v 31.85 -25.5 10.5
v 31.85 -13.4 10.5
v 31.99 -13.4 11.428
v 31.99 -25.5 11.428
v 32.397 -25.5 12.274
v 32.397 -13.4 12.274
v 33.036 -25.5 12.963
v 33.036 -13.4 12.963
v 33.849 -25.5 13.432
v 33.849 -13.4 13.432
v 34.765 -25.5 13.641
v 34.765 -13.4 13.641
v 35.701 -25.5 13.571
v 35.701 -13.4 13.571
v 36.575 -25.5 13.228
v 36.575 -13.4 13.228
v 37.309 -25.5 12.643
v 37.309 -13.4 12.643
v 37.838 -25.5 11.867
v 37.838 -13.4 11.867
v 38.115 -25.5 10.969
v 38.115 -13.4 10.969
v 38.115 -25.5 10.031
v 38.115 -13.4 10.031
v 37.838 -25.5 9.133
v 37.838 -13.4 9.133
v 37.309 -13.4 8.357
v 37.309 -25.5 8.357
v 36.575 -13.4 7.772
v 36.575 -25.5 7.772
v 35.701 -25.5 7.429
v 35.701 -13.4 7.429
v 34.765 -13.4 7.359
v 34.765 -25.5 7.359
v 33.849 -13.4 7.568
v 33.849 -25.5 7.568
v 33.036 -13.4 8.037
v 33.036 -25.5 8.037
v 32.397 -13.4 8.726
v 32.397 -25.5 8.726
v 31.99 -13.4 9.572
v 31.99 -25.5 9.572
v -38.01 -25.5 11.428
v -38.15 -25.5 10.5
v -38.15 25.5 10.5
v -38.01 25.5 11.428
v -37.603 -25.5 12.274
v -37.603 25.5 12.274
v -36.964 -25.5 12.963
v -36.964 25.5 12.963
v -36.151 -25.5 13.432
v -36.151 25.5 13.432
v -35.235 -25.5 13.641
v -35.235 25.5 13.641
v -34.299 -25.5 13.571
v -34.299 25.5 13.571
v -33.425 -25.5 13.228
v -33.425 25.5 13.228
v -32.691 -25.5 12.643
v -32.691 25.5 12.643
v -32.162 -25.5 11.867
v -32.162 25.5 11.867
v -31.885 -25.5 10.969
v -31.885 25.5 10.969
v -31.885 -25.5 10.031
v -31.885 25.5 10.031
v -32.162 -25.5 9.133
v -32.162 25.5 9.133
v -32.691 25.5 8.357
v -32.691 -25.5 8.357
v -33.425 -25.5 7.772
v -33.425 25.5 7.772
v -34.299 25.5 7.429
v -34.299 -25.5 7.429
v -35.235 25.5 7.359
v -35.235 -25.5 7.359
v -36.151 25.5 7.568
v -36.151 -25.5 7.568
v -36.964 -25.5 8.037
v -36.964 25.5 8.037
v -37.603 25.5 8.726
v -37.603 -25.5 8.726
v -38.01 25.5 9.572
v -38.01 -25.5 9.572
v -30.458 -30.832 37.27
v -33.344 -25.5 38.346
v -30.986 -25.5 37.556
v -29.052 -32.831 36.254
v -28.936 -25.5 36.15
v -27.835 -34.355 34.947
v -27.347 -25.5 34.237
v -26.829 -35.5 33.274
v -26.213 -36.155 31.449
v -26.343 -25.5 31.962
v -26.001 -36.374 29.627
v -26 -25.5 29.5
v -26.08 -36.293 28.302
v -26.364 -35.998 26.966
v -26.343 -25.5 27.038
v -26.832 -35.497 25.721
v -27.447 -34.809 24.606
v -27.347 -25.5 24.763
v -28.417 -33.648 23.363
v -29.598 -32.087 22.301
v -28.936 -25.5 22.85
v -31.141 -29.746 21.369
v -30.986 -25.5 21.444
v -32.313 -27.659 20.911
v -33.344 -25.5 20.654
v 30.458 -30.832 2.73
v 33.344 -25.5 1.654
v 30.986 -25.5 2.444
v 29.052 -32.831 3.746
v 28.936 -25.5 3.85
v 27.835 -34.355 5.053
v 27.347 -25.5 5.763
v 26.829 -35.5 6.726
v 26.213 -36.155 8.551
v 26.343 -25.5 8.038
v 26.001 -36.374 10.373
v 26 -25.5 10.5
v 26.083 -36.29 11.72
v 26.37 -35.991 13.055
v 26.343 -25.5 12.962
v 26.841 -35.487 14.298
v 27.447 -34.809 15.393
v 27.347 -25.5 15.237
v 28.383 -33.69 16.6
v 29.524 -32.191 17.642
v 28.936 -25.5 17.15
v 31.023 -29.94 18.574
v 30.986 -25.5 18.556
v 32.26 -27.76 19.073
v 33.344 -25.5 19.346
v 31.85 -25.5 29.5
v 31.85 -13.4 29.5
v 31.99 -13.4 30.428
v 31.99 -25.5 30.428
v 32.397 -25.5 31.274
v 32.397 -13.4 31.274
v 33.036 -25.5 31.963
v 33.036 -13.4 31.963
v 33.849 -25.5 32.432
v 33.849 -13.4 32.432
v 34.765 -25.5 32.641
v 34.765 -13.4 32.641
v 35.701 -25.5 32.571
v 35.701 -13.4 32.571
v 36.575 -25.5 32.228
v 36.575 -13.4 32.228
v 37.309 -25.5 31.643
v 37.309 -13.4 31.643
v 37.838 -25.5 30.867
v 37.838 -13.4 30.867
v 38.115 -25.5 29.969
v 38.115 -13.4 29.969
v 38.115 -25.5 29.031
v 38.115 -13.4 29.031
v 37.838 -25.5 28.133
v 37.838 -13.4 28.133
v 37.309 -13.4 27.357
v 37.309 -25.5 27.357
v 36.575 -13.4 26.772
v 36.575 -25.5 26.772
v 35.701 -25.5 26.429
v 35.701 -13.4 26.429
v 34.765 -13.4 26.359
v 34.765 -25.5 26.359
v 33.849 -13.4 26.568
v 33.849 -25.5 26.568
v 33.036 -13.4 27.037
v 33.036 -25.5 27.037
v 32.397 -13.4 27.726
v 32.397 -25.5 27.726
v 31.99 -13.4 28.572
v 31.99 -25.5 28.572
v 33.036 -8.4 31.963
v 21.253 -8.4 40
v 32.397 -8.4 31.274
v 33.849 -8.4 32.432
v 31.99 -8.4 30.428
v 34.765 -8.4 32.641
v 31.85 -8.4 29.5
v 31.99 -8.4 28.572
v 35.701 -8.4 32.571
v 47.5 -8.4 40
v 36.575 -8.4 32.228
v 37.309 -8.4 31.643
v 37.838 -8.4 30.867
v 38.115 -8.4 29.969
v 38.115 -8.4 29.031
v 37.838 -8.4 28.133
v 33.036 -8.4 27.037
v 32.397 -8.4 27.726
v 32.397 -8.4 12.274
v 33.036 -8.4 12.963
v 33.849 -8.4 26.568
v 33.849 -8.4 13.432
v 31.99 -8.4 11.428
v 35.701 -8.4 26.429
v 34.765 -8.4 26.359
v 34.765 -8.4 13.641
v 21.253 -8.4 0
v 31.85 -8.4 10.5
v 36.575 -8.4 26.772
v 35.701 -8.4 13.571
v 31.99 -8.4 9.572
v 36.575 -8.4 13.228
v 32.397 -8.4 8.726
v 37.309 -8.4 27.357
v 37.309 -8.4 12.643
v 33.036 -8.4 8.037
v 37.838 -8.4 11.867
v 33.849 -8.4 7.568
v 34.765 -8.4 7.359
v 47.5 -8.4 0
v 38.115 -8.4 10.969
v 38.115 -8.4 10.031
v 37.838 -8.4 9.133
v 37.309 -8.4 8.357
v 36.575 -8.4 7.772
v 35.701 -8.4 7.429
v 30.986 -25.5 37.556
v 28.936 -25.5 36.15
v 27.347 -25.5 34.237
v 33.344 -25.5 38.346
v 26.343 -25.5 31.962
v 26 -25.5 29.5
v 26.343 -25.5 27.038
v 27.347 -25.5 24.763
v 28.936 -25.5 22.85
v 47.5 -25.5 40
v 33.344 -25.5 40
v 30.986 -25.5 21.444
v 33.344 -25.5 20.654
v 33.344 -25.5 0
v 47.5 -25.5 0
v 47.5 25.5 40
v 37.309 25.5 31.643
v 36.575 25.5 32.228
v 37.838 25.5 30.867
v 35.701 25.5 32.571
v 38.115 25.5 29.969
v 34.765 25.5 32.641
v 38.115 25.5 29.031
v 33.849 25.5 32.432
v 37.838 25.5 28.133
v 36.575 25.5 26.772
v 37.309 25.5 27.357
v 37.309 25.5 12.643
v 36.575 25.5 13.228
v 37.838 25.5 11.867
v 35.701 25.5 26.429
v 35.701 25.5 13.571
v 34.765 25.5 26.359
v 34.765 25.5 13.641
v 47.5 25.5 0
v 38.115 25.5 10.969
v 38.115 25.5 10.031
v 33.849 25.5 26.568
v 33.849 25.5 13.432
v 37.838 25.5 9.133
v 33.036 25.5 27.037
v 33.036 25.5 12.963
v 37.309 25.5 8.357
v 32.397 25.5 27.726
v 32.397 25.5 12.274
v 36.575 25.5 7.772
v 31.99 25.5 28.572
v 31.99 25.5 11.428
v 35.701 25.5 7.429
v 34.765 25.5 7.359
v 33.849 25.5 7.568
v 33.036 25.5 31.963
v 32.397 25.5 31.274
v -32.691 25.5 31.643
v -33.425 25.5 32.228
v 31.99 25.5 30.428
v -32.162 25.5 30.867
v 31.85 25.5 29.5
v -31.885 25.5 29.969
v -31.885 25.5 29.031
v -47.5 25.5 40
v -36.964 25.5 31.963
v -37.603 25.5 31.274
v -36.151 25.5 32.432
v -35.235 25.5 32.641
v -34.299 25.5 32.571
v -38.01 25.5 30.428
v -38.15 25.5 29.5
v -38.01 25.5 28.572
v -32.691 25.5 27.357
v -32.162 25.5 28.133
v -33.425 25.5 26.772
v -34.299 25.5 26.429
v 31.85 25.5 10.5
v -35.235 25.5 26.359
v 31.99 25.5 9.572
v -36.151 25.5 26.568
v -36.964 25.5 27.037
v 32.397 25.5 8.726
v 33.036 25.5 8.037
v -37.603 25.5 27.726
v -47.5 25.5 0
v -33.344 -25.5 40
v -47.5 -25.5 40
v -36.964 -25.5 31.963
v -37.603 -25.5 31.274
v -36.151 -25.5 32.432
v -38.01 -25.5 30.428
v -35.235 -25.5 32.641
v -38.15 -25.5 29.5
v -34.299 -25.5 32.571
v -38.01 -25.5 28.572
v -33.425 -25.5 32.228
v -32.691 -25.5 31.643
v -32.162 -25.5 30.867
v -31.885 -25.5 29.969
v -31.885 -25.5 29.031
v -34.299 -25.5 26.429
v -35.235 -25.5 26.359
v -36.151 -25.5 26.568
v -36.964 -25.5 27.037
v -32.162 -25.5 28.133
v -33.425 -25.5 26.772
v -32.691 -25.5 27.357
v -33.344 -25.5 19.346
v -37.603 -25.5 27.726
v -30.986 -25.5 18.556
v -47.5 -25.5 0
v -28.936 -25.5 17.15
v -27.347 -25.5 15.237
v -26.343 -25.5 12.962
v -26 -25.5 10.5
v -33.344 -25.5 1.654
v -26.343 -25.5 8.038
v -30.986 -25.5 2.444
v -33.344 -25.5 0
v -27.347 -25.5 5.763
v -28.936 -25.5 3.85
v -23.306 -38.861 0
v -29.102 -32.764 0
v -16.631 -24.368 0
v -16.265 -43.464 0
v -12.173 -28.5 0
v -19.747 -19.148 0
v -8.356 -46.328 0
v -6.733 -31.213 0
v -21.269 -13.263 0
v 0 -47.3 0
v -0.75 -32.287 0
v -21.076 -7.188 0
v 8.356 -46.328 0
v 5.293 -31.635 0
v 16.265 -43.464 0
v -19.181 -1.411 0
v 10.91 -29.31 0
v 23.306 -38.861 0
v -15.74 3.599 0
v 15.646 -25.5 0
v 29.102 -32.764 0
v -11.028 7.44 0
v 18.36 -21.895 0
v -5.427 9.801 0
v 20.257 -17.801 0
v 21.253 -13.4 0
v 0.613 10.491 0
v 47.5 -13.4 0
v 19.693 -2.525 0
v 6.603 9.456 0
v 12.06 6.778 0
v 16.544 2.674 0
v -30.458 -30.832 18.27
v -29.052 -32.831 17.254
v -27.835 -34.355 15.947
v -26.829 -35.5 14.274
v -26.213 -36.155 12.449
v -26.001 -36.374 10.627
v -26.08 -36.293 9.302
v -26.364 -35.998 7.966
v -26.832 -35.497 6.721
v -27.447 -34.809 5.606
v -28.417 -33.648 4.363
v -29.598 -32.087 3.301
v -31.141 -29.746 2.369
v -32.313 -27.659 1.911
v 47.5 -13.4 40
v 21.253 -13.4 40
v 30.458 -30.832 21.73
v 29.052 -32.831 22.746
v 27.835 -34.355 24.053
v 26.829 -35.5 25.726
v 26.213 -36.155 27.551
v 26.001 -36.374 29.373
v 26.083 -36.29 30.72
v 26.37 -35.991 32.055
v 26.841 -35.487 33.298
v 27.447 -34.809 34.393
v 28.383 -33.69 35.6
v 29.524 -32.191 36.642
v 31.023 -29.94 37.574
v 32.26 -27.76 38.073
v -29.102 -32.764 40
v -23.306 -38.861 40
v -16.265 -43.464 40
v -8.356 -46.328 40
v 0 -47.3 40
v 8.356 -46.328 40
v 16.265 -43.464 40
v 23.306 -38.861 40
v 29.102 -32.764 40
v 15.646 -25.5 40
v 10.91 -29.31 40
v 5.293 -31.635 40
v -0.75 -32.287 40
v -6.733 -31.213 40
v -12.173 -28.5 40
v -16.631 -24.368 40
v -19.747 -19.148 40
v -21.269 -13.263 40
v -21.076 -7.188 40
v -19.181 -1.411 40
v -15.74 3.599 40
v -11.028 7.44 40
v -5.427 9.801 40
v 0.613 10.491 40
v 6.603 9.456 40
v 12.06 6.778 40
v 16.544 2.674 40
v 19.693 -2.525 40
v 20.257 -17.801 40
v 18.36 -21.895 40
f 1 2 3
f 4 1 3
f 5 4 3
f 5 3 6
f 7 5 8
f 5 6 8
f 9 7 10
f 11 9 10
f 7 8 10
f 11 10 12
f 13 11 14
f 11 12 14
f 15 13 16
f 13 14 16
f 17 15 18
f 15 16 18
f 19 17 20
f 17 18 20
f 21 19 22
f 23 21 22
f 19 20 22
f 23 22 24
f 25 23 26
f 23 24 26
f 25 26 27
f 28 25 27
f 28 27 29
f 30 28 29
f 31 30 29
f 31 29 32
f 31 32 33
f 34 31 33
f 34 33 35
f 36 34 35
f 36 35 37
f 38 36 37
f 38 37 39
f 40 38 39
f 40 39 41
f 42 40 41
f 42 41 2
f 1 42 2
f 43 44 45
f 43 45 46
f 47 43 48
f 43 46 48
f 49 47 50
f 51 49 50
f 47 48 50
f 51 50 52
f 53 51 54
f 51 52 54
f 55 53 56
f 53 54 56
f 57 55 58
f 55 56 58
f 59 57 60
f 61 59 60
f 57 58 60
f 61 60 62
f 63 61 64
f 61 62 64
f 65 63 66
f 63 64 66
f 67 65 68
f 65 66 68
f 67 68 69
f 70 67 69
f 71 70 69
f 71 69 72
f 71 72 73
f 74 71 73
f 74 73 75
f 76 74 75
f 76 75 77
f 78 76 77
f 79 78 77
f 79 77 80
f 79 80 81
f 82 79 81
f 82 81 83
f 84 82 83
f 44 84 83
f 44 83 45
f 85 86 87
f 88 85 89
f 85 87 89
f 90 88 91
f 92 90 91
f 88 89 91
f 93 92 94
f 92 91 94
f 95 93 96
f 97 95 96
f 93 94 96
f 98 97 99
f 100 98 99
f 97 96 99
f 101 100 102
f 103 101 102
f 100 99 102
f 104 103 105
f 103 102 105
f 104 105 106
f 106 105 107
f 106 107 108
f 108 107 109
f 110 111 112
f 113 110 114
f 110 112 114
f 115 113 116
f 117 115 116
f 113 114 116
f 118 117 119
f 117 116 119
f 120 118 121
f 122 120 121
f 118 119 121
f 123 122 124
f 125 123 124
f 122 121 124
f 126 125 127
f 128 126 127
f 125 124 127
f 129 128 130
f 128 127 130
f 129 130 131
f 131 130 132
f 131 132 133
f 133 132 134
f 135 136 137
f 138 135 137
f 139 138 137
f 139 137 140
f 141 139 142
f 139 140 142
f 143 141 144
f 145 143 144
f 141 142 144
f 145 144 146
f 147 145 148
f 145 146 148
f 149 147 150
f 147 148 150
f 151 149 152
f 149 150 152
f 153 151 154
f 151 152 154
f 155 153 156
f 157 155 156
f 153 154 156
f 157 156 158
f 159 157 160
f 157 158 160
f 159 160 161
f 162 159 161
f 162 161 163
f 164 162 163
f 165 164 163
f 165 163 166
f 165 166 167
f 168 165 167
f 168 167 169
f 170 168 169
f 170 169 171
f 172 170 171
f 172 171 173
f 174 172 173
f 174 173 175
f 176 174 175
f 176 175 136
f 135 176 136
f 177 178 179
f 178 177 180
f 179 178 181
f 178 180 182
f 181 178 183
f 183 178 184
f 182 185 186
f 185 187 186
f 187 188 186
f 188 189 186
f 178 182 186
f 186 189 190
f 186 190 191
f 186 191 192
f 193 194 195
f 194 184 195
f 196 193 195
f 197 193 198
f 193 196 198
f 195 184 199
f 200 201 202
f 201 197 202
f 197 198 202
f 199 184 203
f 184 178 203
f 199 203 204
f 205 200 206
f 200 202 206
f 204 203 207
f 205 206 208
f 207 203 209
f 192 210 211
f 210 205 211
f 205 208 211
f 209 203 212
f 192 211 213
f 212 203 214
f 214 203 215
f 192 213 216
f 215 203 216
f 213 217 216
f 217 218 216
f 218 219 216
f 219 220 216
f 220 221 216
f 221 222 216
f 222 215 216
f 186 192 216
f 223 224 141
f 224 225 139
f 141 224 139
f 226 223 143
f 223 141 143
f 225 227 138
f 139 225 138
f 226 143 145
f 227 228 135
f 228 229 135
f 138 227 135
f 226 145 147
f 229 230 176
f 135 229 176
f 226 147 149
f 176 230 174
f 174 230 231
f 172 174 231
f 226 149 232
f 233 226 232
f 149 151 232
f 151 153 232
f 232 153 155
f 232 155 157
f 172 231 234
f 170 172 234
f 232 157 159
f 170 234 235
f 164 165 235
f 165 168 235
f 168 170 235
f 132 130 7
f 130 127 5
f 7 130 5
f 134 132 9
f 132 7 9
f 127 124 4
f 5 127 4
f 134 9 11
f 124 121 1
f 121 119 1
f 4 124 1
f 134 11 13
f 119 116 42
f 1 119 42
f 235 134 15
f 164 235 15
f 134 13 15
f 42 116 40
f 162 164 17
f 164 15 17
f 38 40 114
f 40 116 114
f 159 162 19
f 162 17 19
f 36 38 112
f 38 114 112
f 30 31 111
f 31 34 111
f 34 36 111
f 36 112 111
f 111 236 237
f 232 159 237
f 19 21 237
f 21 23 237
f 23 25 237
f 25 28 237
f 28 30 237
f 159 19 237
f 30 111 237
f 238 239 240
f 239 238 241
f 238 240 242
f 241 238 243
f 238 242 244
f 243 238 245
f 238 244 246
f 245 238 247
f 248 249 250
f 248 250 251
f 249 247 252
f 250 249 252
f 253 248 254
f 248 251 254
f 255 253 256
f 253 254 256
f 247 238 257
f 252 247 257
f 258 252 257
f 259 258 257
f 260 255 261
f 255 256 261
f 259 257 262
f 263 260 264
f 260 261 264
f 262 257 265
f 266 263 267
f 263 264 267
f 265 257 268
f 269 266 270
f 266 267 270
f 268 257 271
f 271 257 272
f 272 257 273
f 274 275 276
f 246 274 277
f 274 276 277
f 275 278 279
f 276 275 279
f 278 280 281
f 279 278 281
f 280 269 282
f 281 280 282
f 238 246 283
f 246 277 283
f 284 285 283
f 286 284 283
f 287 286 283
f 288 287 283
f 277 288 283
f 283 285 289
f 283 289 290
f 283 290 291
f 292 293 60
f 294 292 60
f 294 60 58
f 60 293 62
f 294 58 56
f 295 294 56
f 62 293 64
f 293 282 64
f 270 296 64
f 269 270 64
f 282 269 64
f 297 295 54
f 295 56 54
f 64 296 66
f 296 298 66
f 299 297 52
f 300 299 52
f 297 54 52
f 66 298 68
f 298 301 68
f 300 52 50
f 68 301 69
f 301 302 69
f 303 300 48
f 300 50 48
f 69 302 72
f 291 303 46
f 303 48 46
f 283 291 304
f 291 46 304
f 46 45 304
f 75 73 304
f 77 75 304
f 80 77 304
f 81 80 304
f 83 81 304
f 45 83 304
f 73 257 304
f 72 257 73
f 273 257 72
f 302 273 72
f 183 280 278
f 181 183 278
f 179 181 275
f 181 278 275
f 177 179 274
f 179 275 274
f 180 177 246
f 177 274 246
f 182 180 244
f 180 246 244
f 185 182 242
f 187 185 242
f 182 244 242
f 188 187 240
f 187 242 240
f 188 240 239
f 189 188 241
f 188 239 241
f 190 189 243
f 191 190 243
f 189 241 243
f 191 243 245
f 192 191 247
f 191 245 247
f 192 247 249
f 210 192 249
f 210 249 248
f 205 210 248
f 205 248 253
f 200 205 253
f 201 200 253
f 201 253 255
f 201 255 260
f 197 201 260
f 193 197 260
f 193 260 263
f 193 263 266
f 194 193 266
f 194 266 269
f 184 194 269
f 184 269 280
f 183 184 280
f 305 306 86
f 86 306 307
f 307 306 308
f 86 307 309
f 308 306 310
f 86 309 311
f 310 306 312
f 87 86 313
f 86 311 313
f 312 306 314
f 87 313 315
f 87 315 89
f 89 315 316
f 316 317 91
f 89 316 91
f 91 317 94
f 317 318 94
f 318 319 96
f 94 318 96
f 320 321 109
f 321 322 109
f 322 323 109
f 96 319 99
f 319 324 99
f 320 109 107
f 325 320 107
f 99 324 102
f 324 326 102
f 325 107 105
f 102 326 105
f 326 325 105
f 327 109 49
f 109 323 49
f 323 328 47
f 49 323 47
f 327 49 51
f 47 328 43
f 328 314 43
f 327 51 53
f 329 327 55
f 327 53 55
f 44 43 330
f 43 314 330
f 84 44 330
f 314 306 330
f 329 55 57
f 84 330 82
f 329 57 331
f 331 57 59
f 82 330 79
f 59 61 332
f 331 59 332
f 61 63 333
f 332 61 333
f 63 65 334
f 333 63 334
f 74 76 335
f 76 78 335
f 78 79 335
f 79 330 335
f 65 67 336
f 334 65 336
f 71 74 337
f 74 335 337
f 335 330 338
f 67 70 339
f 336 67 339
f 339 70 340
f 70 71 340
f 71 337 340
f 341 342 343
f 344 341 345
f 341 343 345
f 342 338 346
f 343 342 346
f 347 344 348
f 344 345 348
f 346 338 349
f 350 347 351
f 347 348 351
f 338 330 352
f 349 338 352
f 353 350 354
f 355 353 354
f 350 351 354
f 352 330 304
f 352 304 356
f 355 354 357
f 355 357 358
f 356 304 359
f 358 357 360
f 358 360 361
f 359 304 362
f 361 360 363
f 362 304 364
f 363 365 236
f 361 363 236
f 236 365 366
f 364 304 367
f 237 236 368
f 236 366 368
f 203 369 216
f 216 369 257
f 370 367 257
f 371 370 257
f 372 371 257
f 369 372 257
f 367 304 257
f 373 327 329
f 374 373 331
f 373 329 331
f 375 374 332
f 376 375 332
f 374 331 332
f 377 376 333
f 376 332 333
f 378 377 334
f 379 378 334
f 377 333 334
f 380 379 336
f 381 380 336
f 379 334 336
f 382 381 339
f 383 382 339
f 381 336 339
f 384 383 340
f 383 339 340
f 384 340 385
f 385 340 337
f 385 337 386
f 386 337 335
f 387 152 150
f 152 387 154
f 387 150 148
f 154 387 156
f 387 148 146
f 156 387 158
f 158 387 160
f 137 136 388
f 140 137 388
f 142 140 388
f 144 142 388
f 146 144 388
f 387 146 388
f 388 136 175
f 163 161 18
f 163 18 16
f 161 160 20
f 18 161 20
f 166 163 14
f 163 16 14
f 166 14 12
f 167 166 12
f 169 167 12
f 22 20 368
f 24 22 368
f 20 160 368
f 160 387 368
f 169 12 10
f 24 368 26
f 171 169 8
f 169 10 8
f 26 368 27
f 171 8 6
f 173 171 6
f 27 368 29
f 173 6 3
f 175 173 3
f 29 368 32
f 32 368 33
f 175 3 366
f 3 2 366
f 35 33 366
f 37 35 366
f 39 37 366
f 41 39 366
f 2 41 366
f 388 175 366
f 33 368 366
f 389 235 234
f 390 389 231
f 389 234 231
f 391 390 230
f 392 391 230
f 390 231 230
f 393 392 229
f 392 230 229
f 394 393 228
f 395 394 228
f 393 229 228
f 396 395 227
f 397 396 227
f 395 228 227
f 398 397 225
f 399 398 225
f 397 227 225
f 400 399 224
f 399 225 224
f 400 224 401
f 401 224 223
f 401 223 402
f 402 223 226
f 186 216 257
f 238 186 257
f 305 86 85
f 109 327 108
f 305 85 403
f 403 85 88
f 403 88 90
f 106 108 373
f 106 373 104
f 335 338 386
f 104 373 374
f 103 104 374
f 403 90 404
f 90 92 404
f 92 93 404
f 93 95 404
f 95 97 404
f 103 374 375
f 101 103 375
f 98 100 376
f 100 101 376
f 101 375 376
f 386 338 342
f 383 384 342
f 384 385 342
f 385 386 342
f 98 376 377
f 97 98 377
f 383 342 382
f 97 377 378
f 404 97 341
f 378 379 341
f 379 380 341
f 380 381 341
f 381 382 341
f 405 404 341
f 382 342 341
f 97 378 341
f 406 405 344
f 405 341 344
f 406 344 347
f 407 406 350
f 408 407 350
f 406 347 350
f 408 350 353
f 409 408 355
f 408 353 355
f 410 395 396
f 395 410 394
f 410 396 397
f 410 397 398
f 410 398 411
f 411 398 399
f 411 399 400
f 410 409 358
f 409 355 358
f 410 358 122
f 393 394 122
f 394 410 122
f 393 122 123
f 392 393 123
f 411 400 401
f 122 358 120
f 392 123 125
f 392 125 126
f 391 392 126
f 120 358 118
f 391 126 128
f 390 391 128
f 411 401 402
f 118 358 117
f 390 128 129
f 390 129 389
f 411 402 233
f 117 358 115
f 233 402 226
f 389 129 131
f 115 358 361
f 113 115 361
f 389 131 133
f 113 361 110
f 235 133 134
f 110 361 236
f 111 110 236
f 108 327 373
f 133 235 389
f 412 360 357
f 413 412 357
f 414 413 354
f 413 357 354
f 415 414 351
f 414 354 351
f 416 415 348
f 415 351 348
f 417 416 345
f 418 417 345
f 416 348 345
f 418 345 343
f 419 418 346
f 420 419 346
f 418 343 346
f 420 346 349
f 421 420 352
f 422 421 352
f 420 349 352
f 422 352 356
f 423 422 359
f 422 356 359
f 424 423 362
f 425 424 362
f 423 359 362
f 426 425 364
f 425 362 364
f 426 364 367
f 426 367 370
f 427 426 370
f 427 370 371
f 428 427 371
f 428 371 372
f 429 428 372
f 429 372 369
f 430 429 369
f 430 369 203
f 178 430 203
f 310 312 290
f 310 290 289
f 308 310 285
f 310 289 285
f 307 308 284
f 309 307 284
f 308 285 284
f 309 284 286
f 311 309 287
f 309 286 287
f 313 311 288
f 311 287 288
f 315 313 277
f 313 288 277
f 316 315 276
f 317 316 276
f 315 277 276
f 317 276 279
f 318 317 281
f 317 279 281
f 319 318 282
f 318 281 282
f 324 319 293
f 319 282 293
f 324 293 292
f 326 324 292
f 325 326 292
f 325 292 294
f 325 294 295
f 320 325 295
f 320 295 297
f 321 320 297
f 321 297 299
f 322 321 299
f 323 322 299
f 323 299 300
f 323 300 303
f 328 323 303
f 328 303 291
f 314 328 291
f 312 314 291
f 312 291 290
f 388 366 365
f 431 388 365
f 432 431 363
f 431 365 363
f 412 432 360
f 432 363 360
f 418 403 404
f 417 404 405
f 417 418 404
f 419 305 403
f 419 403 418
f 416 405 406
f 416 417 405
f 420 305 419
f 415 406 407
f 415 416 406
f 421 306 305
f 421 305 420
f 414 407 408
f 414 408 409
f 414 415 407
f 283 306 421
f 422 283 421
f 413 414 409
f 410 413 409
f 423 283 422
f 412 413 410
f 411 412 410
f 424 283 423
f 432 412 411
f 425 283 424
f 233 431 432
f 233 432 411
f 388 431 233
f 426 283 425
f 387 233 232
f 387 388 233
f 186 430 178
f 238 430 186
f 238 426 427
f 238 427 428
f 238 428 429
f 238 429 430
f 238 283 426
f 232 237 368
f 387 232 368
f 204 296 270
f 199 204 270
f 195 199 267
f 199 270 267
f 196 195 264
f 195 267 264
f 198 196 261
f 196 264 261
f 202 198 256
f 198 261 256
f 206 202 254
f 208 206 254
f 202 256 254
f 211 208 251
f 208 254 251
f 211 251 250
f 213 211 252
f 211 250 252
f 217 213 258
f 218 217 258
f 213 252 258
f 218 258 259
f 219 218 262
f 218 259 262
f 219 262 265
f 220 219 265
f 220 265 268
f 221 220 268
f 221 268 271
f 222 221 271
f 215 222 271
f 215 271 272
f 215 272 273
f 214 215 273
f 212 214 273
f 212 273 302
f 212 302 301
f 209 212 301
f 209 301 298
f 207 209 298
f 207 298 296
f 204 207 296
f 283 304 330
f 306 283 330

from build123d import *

# Parameters (mm, degrees)
F1_DEPTH = 40
F2_R     = 3.15
F3_DEPTH = 72.801
F4_START = -51
F2_R_2   = 9
F4_DEPTH = 21.8010001


with BuildPart() as f1:
    # F0 (on Top) → F1 (new body)
    with BuildSketch(Plane.XY):
        with BuildLine():
            Line((-47.5, -25.5), (-33.3436650655, -25.5))
            ThreePointArc((-33.3436650655, -25.5), (-30.4663749074, 9.0188353073), (0, 25.5))
            Line((0, 25.5), (-47.5, 25.5))
            Line((-47.5, 25.5), (-47.5, -25.5))
        make_face()
        with BuildLine():
            Line((36.3140468689, -8.4), (47.5, -8.4))
            Line((47.5, -8.4), (47.5, 25.5))
            Line((47.5, 25.5), (0, 25.5))
            ThreePointArc((0, 25.5), (24.8390821086, 15.7078935656), (36.3140468689, -8.4))
        make_face()
        with BuildLine():
            ThreePointArc((0, 25.5), (-30.4663749074, 9.0188353073), (-33.3436650655, -25.5))
            Line((-33.3436650655, -25.5), (-15.6460857725, -25.5))
            ThreePointArc((-15.6460857725, -25.5), (-8.9979547856, 8.5164056838), (21.2534703049, -8.4))
            Line((21.2534703049, -8.4), (36.3140468689, -8.4))
            ThreePointArc((36.3140468689, -8.4), (24.8390821086, 15.7078935656), (0, 25.5))
        make_face()
        with BuildLine():
            Line((15.6460857725, -25.5), (33.3436650655, -25.5))
            ThreePointArc((33.3436650655, -25.5), (35.3504131233, -19.5780350319), (36.3140468689, -13.4))
            Line((36.3140468689, -13.4), (21.2534703049, -13.4))
            ThreePointArc((21.2534703049, -13.4), (19.4164056838, -19.8979547856), (15.6460857725, -25.5))
        make_face()
        with BuildLine():
            ThreePointArc((-33.3436650655, -25.5), (0, -47.3), (33.3436650655, -25.5))
            Line((33.3436650655, -25.5), (15.6460857725, -25.5))
            ThreePointArc((15.6460857725, -25.5), (0, -32.3), (-15.6460857725, -25.5))
            Line((-15.6460857725, -25.5), (-33.3436650655, -25.5))
        make_face()
        with BuildLine():
            Line((33.3436650655, -25.5), (47.5, -25.5))
            Line((47.5, -25.5), (47.5, -13.4))
            Line((47.5, -13.4), (36.3140468689, -13.4))
            ThreePointArc((36.3140468689, -13.4), (35.3504131233, -19.5780350319), (33.3436650655, -25.5))
        make_face()
    extrude(amount=F1_DEPTH)

    # F2 (on face) → F3 (cut, through all)
    with BuildSketch(Plane(origin=(0, 25.5, 0), x_dir=(-1, 0, 0), z_dir=(0, 1, 0))):
        with Locations((-35, 29.5)):
            Circle(F2_R)
        with Locations((-35, 10.5)):
            Circle(F2_R)
        with Locations((35, 29.5)):
            Circle(F2_R)
        with Locations((35, 10.5)):
            Circle(F2_R)
    extrude(amount=-F3_DEPTH, mode=Mode.SUBTRACT)

    # F2 (on face) → F4 (cut)
    with BuildSketch(Plane(origin=(0, 25.5, 0), x_dir=(-1, 0, 0), z_dir=(0, 1, 0)).offset(F4_START)):
        with Locations((-35, 29.5)):
            Circle(F2_R_2)
        with Locations((-35, 29.5)):
            Circle(F2_R, mode=Mode.SUBTRACT)
        with Locations((-35, 10.5)):
            Circle(F2_R_2)
        with Locations((-35, 10.5)):
            Circle(F2_R, mode=Mode.SUBTRACT)
        with Locations((35, 10.5)):
            Circle(F2_R_2)
        with Locations((35, 10.5)):
            Circle(F2_R, mode=Mode.SUBTRACT)
        with Locations((35, 29.5)):
            Circle(F2_R_2)
        with Locations((35, 29.5)):
            Circle(F2_R, mode=Mode.SUBTRACT)
    extrude(amount=-F4_DEPTH, mode=Mode.SUBTRACT)


solid = f1.part
